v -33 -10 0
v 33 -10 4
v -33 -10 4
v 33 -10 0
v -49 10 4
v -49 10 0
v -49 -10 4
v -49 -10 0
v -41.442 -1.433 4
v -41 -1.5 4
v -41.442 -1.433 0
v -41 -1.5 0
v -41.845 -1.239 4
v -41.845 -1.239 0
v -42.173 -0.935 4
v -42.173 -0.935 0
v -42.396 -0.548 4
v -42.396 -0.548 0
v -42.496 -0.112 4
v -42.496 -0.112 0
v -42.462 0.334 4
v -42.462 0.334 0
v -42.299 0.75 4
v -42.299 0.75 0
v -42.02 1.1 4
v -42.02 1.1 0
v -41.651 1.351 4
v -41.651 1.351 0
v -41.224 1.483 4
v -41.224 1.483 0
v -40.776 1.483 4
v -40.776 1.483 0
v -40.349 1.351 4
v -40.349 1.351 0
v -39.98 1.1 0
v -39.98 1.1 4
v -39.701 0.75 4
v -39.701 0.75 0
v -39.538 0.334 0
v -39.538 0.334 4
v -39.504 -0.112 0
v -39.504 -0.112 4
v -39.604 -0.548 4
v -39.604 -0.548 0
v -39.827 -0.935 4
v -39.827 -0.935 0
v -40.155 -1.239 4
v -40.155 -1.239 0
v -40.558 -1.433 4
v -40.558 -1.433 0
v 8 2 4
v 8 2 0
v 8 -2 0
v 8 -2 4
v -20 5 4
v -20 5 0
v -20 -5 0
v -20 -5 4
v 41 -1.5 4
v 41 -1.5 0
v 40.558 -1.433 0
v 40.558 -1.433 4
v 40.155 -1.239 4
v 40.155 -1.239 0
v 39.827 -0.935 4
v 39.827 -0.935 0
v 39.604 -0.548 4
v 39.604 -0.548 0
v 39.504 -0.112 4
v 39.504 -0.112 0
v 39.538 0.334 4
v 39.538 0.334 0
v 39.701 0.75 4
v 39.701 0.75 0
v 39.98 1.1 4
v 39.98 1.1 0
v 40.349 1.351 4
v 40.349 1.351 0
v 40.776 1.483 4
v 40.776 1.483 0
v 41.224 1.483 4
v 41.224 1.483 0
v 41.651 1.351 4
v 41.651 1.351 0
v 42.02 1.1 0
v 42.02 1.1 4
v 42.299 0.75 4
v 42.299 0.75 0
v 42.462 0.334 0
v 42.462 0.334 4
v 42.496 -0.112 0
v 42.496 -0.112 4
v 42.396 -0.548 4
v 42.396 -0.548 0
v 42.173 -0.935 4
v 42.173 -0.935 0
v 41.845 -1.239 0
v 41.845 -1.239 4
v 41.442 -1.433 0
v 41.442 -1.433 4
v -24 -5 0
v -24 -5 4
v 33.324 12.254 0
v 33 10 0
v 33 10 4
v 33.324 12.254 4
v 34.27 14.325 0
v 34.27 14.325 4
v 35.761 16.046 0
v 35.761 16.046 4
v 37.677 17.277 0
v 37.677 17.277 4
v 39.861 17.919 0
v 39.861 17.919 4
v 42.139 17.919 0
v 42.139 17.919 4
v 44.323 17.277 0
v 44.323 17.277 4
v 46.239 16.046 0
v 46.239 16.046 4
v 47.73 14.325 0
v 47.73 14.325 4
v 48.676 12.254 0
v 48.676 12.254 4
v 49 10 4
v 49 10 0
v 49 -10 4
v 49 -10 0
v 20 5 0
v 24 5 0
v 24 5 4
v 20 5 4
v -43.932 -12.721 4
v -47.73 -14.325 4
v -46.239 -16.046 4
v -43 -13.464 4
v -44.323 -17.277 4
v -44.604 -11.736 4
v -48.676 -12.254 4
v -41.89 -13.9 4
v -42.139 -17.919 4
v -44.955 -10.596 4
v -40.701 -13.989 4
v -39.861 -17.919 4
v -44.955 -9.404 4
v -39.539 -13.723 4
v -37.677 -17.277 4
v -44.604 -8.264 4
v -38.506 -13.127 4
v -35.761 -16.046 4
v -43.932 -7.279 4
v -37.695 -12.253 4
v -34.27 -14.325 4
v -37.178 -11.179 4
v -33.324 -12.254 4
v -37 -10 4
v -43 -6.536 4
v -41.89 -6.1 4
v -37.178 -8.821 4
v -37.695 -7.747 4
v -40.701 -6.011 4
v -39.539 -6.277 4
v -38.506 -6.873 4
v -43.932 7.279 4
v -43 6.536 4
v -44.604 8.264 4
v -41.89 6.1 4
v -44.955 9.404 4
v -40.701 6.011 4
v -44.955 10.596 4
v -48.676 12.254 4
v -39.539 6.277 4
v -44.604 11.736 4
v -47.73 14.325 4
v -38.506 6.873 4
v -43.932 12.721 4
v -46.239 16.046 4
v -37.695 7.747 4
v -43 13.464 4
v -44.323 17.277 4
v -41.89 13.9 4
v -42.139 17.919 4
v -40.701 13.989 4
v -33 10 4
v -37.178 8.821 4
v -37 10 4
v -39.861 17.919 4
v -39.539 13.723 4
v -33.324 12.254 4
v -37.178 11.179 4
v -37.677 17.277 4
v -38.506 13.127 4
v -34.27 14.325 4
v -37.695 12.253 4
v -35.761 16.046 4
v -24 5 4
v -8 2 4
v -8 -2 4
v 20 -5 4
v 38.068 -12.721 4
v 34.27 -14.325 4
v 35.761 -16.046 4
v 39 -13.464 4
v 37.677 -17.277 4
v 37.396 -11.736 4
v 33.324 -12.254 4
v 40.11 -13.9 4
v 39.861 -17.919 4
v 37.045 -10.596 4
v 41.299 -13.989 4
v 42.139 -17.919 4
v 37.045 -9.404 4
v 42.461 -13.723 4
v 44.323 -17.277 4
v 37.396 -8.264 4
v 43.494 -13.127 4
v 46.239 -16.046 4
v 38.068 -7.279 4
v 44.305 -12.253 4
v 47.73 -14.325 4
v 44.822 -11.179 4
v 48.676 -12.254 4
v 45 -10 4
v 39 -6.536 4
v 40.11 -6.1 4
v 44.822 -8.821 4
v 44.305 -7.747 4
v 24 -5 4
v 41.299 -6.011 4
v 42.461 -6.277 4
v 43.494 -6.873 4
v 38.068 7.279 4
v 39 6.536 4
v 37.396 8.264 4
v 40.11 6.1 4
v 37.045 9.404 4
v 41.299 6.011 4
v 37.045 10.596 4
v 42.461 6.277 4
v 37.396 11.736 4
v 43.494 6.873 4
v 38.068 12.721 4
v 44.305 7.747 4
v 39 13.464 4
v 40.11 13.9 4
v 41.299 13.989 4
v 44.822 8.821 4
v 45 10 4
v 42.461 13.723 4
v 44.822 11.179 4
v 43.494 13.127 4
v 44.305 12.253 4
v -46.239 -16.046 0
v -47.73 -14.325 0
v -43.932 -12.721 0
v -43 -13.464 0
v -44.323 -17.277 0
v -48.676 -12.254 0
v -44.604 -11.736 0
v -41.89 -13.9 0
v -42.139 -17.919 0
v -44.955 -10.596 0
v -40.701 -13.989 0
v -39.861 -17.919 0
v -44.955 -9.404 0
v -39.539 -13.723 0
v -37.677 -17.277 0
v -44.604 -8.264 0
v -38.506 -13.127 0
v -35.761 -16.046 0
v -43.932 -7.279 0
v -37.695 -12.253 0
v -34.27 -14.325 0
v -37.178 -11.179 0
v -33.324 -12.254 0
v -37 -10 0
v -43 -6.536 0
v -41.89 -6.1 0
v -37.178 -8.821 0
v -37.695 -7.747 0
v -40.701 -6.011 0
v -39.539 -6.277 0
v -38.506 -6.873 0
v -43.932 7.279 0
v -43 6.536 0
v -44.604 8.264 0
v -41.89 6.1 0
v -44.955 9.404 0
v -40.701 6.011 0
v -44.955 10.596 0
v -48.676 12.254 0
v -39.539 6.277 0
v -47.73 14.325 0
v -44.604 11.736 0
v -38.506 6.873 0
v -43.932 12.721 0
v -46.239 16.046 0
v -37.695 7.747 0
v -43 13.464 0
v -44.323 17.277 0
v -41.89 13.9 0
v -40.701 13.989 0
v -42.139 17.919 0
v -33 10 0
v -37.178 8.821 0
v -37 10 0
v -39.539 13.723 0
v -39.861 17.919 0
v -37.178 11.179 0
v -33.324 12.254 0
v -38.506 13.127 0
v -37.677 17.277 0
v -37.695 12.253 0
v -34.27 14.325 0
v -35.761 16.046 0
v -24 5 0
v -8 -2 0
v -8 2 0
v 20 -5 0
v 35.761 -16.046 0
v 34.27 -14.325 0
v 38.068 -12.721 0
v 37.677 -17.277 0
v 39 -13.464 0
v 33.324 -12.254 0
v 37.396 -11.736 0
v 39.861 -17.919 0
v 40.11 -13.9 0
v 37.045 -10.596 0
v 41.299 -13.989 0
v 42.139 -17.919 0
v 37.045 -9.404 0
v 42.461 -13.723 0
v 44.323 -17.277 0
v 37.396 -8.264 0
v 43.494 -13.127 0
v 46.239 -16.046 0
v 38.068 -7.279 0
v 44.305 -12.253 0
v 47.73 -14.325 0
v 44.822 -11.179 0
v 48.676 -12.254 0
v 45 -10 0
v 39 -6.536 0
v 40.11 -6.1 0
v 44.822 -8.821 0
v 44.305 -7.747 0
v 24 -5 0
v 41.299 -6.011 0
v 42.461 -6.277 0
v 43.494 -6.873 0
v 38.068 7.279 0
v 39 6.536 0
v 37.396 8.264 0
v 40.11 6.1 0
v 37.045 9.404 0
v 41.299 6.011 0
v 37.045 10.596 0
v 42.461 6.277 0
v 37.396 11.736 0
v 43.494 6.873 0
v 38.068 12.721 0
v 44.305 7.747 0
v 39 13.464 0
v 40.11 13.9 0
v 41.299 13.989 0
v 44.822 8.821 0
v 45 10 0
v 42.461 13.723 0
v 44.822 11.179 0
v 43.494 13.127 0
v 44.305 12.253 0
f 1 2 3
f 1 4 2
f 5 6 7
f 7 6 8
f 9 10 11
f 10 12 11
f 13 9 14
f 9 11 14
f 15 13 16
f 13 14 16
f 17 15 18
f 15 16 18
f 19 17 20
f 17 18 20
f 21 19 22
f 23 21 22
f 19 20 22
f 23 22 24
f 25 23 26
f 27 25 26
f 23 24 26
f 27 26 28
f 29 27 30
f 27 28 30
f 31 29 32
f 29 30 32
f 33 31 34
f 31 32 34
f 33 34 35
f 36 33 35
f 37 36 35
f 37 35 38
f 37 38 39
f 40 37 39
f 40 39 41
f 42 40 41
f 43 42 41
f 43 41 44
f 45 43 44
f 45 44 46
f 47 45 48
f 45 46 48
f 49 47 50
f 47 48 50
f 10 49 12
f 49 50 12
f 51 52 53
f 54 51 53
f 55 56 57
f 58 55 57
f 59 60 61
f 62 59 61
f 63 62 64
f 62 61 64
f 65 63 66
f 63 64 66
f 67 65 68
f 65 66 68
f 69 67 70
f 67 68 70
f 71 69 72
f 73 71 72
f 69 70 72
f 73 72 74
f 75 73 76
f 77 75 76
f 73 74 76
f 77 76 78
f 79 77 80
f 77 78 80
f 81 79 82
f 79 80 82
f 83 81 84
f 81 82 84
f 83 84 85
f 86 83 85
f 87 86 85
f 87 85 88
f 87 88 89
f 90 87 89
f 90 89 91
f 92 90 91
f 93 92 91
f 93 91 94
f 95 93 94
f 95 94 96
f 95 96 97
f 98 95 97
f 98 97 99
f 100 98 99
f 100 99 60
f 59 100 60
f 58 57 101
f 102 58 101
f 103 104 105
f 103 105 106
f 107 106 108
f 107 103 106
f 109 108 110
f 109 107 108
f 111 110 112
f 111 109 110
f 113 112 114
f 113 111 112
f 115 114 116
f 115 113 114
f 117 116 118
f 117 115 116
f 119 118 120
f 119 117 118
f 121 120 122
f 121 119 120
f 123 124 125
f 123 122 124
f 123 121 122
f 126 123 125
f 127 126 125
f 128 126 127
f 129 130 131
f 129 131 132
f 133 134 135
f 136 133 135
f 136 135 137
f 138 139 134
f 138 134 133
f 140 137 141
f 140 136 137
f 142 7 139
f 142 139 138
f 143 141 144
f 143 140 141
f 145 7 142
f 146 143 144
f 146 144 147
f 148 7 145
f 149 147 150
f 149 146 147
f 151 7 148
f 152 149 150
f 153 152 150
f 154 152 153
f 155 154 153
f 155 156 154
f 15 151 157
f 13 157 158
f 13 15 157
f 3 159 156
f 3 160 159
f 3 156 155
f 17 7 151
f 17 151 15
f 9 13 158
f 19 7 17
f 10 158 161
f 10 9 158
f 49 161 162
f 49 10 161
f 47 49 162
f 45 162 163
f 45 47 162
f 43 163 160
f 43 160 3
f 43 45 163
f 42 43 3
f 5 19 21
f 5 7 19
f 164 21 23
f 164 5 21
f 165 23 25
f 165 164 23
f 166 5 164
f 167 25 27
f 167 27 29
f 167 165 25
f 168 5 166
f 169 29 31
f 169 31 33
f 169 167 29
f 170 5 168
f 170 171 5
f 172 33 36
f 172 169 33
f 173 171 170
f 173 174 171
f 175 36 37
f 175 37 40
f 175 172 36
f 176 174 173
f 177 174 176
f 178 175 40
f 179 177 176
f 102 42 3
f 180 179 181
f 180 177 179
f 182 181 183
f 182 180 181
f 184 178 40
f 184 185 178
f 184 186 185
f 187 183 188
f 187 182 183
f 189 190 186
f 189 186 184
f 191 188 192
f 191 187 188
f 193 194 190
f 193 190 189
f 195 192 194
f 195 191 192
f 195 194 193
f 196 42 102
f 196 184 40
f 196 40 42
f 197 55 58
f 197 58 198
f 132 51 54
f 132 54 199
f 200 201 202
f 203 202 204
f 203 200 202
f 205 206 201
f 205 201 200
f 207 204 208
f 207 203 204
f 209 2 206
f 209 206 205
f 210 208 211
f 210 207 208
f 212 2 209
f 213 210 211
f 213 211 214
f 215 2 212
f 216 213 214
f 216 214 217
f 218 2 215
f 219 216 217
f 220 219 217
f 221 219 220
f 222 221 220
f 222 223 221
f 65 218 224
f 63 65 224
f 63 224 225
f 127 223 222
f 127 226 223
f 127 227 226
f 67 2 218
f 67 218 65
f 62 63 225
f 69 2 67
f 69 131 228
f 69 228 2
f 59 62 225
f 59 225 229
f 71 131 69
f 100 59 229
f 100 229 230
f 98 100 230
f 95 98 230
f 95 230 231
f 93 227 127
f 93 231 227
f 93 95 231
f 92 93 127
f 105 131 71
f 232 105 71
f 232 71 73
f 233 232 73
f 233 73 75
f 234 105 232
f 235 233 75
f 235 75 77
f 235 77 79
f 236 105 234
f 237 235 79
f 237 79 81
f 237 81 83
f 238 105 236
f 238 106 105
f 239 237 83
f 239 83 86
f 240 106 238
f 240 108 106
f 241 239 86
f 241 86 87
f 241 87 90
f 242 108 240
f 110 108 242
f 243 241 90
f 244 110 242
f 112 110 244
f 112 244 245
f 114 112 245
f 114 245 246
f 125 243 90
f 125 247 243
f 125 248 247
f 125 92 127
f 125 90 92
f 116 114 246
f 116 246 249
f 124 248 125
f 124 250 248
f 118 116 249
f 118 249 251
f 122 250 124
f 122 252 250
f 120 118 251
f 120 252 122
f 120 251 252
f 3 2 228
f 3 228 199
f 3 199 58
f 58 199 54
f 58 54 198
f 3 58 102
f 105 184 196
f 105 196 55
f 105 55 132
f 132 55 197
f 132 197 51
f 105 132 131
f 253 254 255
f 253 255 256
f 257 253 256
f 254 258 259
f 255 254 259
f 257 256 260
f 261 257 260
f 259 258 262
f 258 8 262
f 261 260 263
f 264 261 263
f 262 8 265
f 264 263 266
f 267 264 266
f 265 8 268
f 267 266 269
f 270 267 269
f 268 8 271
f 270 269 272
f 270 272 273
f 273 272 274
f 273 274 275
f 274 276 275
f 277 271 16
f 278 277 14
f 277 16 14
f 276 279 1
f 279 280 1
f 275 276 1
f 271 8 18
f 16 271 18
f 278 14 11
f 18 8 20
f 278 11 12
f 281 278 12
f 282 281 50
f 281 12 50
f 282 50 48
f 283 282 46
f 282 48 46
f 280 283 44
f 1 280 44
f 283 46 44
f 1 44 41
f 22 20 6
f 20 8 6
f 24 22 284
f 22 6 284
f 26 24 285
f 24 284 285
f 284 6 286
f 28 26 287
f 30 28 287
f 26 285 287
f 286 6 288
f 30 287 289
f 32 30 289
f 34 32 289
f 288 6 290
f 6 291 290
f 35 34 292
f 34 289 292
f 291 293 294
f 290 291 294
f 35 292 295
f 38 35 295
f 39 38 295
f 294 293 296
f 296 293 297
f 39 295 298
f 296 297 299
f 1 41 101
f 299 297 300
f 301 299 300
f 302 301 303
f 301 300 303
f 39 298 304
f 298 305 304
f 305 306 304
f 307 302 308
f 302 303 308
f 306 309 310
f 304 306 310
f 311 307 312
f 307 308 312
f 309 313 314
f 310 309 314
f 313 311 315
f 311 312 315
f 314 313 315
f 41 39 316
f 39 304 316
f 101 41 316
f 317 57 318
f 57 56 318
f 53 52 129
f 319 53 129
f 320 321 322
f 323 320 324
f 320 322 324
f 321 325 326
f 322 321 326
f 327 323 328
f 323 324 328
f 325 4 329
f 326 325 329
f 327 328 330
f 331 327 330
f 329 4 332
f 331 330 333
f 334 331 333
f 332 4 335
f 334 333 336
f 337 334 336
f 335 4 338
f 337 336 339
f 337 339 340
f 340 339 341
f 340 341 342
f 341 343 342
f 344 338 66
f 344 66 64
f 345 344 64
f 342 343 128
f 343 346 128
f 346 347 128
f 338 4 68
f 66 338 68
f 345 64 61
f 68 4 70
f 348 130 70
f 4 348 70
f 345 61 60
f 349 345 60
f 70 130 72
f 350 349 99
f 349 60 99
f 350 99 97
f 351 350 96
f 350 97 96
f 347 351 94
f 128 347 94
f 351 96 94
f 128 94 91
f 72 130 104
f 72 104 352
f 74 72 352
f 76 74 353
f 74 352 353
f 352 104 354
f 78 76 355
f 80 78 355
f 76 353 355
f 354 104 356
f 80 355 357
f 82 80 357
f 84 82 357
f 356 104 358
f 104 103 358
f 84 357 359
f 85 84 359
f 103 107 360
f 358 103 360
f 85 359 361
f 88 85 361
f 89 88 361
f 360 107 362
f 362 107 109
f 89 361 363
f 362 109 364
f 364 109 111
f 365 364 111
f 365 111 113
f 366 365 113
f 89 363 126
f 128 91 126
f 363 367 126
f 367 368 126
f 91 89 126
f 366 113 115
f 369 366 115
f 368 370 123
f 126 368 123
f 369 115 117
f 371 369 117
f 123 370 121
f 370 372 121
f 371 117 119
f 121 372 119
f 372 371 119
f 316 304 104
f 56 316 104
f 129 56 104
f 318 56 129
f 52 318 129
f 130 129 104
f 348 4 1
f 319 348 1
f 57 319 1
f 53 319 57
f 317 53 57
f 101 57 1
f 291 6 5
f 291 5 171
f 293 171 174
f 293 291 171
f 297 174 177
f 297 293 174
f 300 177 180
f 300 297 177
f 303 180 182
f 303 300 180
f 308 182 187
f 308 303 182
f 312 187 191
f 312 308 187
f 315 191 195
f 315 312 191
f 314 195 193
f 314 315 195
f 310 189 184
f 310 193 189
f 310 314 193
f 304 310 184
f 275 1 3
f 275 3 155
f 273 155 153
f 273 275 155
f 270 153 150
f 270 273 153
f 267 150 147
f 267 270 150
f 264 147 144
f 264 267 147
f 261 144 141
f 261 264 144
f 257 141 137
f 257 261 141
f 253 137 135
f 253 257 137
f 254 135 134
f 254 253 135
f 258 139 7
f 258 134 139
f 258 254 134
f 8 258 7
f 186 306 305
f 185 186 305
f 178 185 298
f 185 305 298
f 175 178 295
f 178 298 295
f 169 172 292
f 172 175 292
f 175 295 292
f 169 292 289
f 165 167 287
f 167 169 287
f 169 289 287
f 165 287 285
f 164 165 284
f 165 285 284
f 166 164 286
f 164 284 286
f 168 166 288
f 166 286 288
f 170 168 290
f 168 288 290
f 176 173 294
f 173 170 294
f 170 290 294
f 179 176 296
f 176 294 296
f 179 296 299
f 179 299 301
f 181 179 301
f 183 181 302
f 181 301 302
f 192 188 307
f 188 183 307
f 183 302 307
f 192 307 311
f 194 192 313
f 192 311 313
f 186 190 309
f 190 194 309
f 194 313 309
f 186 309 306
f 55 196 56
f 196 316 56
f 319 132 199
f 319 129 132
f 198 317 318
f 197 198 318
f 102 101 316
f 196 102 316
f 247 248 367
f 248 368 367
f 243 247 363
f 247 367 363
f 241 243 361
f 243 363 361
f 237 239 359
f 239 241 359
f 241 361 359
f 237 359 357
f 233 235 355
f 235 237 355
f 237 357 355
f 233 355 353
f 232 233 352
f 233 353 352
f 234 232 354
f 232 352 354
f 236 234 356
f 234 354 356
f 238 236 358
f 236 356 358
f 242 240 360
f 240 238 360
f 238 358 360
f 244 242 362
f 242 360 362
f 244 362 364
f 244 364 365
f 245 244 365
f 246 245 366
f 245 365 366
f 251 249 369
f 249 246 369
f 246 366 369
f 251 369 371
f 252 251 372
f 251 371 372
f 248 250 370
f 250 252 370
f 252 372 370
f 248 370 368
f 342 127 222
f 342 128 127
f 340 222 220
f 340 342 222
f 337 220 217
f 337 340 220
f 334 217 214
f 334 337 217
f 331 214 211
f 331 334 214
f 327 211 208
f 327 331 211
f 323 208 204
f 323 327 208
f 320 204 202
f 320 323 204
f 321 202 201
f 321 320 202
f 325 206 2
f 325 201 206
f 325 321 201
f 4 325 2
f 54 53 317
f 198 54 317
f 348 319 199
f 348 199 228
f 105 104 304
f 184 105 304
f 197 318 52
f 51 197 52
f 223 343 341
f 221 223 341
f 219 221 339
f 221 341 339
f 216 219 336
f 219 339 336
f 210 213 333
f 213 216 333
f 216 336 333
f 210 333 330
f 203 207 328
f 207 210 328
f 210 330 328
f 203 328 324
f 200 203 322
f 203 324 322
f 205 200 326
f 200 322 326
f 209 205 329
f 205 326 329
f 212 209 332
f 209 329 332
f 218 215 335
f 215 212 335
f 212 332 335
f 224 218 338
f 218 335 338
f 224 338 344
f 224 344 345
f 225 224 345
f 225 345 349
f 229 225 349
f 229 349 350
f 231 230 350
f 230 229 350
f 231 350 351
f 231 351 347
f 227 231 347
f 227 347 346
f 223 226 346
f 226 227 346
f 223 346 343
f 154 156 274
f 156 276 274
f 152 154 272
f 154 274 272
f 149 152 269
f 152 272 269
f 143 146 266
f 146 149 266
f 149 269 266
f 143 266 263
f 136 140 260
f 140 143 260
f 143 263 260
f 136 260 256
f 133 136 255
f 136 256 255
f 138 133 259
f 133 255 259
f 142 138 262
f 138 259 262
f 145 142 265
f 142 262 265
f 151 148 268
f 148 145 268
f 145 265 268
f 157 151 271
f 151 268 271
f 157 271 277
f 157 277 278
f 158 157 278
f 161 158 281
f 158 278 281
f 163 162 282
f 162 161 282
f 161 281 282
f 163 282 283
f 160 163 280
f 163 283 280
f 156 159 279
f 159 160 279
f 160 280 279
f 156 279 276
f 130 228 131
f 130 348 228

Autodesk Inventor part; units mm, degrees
ref_plane "YZ Plane" through (0, 0, 0) normal (1, 0, 0) x (0, 1, 0)
ref_plane "XZ Plane" through (0, 0, 0) normal (0, 1, 0) x (-1, 0, 0)
ref_plane "XY Plane" through (0, 0, 0) normal (0, 0, 1) x (1, 0, 0)
sketch "Эскиз1" plane through (0, 0, 0) normal (0, 0, 1) x (1, 0, 0)
  circle A0 centre (-41, -10) radius 4
  circle A1 centre (-41, 10) radius 4
  circle A2 centre (41, 10) radius 4
  circle A3 centre (41, -10) radius 4
  line L0 (-41, 10) -> (41, 10) construction
  line L1 (41, 10) -> (41, -10) construction
  line L2 (41, -10) -> (-41, -10) construction
  line L3 (-41, -10) -> (-41, 10) construction
  arc A4 (-33, 10) -> (-49, 10) centre (-41, 10) ccw
  arc A5 (-49, -10) -> (-33, -10) centre (-41, -10) ccw
  arc A6 (33, -10) -> (49, -10) centre (41, -10) ccw
  arc A7 (49, 10) -> (33, 10) centre (41, 10) ccw
  line L4 (-49, 10) -> (-49, -10)
  line L5 (49, 10) -> (49, -10)
  line L6 (33, 10) -> (-33, 10)
  line L7 (33, -10) -> (-33, -10)
  line L8 (8, -2) -> (-8, -2)
  line L9 (-8, -2) -> (-8, 2)
  line L10 (-8, 2) -> (8, 2)
  line L11 (8, 2) -> (8, -2)
  line L12 (24, 5) -> (20, 5)
  line L13 (20, 5) -> (20, -5)
  line L14 (20, -5) -> (24, -5)
  line L15 (24, -5) -> (24, 5)
  line L16 (0, 10) -> (0, -10)
  line L17 (-24, 5) -> (-20, 5)
  line L18 (-20, 5) -> (-20, -5)
  line L19 (-20, -5) -> (-24, -5)
  line L20 (-24, -5) -> (-24, 5)
  point P0 (0, 0)
  point P1 (41, 0)
  point P2 (0, 2)
  point P3 (8, 0)
  point P4 (20, 0)
  point P5 (-20, 0)
  dimension "d0" = 8
  dimension "d1" = 20
  dimension "d2" = 82
  dimension "d3" = 8
  dimension "d6" = 10
  dimension "d7" = 10
  dimension "d8" = 4
  dimension "d9" = 16
  dimension "d10" = 10
  dimension "d11" = 40
extrude "Выдавливание1" add sketch "Эскиз1" along normal blind 4 contours L6 L16 L10 L9 L8 L7 A5 L4 A4 | L6 A7 L5 A6 L7 L16 L8 L11 L10
sketch "Эскиз2" plane through (0, 0, 4) normal (0, 0, 1) x (1, 0, 0)
  line L0 (-8, -2) -> (-8, 2) projected
  line L1 (-8, 2) -> (8, 2) projected
  line L2 (8, 2) -> (8, -2) projected
  line L3 (8, -2) -> (-8, -2) projected
  circle A0 centre (41, -10) radius 4 projected
  circle A1 centre (41, 10) radius 4 projected
  circle A2 centre (-41, 10) radius 4 projected
  circle A3 centre (-41, -10) radius 4 projected
  line L4 (-20, 5) -> (-20, -5) projected
  line L5 (-20, -5) -> (-24, -5) projected
  line L6 (-24, -5) -> (-24, 5) projected
  line L7 (-24, 5) -> (-20, 5) projected
  line L8 (24, 5) -> (24, -5) projected
  line L9 (24, -5) -> (20, -5) projected
  line L10 (20, -5) -> (20, 5) projected
  line L11 (20, 5) -> (24, 5) projected
  arc A4 (-33, 10) -> (-49, 10) centre (-41, 10) ccw projected
  line L12 (-49, 10) -> (-49, -10) projected
  arc A5 (-49, -10) -> (-33, -10) centre (-41, -10) ccw projected
  line L13 (-33, -10) -> (33, -10) projected
  arc A6 (33, -10) -> (49, -10) centre (41, -10) ccw projected
  line L14 (49, -10) -> (49, 10) projected
  arc A7 (49, 10) -> (33, 10) centre (41, 10) ccw projected
  line L15 (33, 10) -> (-33, 10) projected
  point P0 (0, 0)
  point P1 (41, 0)
  point P2 (-41, 0)
hole "Отверстие1" at (41, 0, 4) at (-41, 0, 4) direction (0, 0, -1) diameter 3 end through all
properties part number "PistonPart1" material "Дерево (вишня)"
